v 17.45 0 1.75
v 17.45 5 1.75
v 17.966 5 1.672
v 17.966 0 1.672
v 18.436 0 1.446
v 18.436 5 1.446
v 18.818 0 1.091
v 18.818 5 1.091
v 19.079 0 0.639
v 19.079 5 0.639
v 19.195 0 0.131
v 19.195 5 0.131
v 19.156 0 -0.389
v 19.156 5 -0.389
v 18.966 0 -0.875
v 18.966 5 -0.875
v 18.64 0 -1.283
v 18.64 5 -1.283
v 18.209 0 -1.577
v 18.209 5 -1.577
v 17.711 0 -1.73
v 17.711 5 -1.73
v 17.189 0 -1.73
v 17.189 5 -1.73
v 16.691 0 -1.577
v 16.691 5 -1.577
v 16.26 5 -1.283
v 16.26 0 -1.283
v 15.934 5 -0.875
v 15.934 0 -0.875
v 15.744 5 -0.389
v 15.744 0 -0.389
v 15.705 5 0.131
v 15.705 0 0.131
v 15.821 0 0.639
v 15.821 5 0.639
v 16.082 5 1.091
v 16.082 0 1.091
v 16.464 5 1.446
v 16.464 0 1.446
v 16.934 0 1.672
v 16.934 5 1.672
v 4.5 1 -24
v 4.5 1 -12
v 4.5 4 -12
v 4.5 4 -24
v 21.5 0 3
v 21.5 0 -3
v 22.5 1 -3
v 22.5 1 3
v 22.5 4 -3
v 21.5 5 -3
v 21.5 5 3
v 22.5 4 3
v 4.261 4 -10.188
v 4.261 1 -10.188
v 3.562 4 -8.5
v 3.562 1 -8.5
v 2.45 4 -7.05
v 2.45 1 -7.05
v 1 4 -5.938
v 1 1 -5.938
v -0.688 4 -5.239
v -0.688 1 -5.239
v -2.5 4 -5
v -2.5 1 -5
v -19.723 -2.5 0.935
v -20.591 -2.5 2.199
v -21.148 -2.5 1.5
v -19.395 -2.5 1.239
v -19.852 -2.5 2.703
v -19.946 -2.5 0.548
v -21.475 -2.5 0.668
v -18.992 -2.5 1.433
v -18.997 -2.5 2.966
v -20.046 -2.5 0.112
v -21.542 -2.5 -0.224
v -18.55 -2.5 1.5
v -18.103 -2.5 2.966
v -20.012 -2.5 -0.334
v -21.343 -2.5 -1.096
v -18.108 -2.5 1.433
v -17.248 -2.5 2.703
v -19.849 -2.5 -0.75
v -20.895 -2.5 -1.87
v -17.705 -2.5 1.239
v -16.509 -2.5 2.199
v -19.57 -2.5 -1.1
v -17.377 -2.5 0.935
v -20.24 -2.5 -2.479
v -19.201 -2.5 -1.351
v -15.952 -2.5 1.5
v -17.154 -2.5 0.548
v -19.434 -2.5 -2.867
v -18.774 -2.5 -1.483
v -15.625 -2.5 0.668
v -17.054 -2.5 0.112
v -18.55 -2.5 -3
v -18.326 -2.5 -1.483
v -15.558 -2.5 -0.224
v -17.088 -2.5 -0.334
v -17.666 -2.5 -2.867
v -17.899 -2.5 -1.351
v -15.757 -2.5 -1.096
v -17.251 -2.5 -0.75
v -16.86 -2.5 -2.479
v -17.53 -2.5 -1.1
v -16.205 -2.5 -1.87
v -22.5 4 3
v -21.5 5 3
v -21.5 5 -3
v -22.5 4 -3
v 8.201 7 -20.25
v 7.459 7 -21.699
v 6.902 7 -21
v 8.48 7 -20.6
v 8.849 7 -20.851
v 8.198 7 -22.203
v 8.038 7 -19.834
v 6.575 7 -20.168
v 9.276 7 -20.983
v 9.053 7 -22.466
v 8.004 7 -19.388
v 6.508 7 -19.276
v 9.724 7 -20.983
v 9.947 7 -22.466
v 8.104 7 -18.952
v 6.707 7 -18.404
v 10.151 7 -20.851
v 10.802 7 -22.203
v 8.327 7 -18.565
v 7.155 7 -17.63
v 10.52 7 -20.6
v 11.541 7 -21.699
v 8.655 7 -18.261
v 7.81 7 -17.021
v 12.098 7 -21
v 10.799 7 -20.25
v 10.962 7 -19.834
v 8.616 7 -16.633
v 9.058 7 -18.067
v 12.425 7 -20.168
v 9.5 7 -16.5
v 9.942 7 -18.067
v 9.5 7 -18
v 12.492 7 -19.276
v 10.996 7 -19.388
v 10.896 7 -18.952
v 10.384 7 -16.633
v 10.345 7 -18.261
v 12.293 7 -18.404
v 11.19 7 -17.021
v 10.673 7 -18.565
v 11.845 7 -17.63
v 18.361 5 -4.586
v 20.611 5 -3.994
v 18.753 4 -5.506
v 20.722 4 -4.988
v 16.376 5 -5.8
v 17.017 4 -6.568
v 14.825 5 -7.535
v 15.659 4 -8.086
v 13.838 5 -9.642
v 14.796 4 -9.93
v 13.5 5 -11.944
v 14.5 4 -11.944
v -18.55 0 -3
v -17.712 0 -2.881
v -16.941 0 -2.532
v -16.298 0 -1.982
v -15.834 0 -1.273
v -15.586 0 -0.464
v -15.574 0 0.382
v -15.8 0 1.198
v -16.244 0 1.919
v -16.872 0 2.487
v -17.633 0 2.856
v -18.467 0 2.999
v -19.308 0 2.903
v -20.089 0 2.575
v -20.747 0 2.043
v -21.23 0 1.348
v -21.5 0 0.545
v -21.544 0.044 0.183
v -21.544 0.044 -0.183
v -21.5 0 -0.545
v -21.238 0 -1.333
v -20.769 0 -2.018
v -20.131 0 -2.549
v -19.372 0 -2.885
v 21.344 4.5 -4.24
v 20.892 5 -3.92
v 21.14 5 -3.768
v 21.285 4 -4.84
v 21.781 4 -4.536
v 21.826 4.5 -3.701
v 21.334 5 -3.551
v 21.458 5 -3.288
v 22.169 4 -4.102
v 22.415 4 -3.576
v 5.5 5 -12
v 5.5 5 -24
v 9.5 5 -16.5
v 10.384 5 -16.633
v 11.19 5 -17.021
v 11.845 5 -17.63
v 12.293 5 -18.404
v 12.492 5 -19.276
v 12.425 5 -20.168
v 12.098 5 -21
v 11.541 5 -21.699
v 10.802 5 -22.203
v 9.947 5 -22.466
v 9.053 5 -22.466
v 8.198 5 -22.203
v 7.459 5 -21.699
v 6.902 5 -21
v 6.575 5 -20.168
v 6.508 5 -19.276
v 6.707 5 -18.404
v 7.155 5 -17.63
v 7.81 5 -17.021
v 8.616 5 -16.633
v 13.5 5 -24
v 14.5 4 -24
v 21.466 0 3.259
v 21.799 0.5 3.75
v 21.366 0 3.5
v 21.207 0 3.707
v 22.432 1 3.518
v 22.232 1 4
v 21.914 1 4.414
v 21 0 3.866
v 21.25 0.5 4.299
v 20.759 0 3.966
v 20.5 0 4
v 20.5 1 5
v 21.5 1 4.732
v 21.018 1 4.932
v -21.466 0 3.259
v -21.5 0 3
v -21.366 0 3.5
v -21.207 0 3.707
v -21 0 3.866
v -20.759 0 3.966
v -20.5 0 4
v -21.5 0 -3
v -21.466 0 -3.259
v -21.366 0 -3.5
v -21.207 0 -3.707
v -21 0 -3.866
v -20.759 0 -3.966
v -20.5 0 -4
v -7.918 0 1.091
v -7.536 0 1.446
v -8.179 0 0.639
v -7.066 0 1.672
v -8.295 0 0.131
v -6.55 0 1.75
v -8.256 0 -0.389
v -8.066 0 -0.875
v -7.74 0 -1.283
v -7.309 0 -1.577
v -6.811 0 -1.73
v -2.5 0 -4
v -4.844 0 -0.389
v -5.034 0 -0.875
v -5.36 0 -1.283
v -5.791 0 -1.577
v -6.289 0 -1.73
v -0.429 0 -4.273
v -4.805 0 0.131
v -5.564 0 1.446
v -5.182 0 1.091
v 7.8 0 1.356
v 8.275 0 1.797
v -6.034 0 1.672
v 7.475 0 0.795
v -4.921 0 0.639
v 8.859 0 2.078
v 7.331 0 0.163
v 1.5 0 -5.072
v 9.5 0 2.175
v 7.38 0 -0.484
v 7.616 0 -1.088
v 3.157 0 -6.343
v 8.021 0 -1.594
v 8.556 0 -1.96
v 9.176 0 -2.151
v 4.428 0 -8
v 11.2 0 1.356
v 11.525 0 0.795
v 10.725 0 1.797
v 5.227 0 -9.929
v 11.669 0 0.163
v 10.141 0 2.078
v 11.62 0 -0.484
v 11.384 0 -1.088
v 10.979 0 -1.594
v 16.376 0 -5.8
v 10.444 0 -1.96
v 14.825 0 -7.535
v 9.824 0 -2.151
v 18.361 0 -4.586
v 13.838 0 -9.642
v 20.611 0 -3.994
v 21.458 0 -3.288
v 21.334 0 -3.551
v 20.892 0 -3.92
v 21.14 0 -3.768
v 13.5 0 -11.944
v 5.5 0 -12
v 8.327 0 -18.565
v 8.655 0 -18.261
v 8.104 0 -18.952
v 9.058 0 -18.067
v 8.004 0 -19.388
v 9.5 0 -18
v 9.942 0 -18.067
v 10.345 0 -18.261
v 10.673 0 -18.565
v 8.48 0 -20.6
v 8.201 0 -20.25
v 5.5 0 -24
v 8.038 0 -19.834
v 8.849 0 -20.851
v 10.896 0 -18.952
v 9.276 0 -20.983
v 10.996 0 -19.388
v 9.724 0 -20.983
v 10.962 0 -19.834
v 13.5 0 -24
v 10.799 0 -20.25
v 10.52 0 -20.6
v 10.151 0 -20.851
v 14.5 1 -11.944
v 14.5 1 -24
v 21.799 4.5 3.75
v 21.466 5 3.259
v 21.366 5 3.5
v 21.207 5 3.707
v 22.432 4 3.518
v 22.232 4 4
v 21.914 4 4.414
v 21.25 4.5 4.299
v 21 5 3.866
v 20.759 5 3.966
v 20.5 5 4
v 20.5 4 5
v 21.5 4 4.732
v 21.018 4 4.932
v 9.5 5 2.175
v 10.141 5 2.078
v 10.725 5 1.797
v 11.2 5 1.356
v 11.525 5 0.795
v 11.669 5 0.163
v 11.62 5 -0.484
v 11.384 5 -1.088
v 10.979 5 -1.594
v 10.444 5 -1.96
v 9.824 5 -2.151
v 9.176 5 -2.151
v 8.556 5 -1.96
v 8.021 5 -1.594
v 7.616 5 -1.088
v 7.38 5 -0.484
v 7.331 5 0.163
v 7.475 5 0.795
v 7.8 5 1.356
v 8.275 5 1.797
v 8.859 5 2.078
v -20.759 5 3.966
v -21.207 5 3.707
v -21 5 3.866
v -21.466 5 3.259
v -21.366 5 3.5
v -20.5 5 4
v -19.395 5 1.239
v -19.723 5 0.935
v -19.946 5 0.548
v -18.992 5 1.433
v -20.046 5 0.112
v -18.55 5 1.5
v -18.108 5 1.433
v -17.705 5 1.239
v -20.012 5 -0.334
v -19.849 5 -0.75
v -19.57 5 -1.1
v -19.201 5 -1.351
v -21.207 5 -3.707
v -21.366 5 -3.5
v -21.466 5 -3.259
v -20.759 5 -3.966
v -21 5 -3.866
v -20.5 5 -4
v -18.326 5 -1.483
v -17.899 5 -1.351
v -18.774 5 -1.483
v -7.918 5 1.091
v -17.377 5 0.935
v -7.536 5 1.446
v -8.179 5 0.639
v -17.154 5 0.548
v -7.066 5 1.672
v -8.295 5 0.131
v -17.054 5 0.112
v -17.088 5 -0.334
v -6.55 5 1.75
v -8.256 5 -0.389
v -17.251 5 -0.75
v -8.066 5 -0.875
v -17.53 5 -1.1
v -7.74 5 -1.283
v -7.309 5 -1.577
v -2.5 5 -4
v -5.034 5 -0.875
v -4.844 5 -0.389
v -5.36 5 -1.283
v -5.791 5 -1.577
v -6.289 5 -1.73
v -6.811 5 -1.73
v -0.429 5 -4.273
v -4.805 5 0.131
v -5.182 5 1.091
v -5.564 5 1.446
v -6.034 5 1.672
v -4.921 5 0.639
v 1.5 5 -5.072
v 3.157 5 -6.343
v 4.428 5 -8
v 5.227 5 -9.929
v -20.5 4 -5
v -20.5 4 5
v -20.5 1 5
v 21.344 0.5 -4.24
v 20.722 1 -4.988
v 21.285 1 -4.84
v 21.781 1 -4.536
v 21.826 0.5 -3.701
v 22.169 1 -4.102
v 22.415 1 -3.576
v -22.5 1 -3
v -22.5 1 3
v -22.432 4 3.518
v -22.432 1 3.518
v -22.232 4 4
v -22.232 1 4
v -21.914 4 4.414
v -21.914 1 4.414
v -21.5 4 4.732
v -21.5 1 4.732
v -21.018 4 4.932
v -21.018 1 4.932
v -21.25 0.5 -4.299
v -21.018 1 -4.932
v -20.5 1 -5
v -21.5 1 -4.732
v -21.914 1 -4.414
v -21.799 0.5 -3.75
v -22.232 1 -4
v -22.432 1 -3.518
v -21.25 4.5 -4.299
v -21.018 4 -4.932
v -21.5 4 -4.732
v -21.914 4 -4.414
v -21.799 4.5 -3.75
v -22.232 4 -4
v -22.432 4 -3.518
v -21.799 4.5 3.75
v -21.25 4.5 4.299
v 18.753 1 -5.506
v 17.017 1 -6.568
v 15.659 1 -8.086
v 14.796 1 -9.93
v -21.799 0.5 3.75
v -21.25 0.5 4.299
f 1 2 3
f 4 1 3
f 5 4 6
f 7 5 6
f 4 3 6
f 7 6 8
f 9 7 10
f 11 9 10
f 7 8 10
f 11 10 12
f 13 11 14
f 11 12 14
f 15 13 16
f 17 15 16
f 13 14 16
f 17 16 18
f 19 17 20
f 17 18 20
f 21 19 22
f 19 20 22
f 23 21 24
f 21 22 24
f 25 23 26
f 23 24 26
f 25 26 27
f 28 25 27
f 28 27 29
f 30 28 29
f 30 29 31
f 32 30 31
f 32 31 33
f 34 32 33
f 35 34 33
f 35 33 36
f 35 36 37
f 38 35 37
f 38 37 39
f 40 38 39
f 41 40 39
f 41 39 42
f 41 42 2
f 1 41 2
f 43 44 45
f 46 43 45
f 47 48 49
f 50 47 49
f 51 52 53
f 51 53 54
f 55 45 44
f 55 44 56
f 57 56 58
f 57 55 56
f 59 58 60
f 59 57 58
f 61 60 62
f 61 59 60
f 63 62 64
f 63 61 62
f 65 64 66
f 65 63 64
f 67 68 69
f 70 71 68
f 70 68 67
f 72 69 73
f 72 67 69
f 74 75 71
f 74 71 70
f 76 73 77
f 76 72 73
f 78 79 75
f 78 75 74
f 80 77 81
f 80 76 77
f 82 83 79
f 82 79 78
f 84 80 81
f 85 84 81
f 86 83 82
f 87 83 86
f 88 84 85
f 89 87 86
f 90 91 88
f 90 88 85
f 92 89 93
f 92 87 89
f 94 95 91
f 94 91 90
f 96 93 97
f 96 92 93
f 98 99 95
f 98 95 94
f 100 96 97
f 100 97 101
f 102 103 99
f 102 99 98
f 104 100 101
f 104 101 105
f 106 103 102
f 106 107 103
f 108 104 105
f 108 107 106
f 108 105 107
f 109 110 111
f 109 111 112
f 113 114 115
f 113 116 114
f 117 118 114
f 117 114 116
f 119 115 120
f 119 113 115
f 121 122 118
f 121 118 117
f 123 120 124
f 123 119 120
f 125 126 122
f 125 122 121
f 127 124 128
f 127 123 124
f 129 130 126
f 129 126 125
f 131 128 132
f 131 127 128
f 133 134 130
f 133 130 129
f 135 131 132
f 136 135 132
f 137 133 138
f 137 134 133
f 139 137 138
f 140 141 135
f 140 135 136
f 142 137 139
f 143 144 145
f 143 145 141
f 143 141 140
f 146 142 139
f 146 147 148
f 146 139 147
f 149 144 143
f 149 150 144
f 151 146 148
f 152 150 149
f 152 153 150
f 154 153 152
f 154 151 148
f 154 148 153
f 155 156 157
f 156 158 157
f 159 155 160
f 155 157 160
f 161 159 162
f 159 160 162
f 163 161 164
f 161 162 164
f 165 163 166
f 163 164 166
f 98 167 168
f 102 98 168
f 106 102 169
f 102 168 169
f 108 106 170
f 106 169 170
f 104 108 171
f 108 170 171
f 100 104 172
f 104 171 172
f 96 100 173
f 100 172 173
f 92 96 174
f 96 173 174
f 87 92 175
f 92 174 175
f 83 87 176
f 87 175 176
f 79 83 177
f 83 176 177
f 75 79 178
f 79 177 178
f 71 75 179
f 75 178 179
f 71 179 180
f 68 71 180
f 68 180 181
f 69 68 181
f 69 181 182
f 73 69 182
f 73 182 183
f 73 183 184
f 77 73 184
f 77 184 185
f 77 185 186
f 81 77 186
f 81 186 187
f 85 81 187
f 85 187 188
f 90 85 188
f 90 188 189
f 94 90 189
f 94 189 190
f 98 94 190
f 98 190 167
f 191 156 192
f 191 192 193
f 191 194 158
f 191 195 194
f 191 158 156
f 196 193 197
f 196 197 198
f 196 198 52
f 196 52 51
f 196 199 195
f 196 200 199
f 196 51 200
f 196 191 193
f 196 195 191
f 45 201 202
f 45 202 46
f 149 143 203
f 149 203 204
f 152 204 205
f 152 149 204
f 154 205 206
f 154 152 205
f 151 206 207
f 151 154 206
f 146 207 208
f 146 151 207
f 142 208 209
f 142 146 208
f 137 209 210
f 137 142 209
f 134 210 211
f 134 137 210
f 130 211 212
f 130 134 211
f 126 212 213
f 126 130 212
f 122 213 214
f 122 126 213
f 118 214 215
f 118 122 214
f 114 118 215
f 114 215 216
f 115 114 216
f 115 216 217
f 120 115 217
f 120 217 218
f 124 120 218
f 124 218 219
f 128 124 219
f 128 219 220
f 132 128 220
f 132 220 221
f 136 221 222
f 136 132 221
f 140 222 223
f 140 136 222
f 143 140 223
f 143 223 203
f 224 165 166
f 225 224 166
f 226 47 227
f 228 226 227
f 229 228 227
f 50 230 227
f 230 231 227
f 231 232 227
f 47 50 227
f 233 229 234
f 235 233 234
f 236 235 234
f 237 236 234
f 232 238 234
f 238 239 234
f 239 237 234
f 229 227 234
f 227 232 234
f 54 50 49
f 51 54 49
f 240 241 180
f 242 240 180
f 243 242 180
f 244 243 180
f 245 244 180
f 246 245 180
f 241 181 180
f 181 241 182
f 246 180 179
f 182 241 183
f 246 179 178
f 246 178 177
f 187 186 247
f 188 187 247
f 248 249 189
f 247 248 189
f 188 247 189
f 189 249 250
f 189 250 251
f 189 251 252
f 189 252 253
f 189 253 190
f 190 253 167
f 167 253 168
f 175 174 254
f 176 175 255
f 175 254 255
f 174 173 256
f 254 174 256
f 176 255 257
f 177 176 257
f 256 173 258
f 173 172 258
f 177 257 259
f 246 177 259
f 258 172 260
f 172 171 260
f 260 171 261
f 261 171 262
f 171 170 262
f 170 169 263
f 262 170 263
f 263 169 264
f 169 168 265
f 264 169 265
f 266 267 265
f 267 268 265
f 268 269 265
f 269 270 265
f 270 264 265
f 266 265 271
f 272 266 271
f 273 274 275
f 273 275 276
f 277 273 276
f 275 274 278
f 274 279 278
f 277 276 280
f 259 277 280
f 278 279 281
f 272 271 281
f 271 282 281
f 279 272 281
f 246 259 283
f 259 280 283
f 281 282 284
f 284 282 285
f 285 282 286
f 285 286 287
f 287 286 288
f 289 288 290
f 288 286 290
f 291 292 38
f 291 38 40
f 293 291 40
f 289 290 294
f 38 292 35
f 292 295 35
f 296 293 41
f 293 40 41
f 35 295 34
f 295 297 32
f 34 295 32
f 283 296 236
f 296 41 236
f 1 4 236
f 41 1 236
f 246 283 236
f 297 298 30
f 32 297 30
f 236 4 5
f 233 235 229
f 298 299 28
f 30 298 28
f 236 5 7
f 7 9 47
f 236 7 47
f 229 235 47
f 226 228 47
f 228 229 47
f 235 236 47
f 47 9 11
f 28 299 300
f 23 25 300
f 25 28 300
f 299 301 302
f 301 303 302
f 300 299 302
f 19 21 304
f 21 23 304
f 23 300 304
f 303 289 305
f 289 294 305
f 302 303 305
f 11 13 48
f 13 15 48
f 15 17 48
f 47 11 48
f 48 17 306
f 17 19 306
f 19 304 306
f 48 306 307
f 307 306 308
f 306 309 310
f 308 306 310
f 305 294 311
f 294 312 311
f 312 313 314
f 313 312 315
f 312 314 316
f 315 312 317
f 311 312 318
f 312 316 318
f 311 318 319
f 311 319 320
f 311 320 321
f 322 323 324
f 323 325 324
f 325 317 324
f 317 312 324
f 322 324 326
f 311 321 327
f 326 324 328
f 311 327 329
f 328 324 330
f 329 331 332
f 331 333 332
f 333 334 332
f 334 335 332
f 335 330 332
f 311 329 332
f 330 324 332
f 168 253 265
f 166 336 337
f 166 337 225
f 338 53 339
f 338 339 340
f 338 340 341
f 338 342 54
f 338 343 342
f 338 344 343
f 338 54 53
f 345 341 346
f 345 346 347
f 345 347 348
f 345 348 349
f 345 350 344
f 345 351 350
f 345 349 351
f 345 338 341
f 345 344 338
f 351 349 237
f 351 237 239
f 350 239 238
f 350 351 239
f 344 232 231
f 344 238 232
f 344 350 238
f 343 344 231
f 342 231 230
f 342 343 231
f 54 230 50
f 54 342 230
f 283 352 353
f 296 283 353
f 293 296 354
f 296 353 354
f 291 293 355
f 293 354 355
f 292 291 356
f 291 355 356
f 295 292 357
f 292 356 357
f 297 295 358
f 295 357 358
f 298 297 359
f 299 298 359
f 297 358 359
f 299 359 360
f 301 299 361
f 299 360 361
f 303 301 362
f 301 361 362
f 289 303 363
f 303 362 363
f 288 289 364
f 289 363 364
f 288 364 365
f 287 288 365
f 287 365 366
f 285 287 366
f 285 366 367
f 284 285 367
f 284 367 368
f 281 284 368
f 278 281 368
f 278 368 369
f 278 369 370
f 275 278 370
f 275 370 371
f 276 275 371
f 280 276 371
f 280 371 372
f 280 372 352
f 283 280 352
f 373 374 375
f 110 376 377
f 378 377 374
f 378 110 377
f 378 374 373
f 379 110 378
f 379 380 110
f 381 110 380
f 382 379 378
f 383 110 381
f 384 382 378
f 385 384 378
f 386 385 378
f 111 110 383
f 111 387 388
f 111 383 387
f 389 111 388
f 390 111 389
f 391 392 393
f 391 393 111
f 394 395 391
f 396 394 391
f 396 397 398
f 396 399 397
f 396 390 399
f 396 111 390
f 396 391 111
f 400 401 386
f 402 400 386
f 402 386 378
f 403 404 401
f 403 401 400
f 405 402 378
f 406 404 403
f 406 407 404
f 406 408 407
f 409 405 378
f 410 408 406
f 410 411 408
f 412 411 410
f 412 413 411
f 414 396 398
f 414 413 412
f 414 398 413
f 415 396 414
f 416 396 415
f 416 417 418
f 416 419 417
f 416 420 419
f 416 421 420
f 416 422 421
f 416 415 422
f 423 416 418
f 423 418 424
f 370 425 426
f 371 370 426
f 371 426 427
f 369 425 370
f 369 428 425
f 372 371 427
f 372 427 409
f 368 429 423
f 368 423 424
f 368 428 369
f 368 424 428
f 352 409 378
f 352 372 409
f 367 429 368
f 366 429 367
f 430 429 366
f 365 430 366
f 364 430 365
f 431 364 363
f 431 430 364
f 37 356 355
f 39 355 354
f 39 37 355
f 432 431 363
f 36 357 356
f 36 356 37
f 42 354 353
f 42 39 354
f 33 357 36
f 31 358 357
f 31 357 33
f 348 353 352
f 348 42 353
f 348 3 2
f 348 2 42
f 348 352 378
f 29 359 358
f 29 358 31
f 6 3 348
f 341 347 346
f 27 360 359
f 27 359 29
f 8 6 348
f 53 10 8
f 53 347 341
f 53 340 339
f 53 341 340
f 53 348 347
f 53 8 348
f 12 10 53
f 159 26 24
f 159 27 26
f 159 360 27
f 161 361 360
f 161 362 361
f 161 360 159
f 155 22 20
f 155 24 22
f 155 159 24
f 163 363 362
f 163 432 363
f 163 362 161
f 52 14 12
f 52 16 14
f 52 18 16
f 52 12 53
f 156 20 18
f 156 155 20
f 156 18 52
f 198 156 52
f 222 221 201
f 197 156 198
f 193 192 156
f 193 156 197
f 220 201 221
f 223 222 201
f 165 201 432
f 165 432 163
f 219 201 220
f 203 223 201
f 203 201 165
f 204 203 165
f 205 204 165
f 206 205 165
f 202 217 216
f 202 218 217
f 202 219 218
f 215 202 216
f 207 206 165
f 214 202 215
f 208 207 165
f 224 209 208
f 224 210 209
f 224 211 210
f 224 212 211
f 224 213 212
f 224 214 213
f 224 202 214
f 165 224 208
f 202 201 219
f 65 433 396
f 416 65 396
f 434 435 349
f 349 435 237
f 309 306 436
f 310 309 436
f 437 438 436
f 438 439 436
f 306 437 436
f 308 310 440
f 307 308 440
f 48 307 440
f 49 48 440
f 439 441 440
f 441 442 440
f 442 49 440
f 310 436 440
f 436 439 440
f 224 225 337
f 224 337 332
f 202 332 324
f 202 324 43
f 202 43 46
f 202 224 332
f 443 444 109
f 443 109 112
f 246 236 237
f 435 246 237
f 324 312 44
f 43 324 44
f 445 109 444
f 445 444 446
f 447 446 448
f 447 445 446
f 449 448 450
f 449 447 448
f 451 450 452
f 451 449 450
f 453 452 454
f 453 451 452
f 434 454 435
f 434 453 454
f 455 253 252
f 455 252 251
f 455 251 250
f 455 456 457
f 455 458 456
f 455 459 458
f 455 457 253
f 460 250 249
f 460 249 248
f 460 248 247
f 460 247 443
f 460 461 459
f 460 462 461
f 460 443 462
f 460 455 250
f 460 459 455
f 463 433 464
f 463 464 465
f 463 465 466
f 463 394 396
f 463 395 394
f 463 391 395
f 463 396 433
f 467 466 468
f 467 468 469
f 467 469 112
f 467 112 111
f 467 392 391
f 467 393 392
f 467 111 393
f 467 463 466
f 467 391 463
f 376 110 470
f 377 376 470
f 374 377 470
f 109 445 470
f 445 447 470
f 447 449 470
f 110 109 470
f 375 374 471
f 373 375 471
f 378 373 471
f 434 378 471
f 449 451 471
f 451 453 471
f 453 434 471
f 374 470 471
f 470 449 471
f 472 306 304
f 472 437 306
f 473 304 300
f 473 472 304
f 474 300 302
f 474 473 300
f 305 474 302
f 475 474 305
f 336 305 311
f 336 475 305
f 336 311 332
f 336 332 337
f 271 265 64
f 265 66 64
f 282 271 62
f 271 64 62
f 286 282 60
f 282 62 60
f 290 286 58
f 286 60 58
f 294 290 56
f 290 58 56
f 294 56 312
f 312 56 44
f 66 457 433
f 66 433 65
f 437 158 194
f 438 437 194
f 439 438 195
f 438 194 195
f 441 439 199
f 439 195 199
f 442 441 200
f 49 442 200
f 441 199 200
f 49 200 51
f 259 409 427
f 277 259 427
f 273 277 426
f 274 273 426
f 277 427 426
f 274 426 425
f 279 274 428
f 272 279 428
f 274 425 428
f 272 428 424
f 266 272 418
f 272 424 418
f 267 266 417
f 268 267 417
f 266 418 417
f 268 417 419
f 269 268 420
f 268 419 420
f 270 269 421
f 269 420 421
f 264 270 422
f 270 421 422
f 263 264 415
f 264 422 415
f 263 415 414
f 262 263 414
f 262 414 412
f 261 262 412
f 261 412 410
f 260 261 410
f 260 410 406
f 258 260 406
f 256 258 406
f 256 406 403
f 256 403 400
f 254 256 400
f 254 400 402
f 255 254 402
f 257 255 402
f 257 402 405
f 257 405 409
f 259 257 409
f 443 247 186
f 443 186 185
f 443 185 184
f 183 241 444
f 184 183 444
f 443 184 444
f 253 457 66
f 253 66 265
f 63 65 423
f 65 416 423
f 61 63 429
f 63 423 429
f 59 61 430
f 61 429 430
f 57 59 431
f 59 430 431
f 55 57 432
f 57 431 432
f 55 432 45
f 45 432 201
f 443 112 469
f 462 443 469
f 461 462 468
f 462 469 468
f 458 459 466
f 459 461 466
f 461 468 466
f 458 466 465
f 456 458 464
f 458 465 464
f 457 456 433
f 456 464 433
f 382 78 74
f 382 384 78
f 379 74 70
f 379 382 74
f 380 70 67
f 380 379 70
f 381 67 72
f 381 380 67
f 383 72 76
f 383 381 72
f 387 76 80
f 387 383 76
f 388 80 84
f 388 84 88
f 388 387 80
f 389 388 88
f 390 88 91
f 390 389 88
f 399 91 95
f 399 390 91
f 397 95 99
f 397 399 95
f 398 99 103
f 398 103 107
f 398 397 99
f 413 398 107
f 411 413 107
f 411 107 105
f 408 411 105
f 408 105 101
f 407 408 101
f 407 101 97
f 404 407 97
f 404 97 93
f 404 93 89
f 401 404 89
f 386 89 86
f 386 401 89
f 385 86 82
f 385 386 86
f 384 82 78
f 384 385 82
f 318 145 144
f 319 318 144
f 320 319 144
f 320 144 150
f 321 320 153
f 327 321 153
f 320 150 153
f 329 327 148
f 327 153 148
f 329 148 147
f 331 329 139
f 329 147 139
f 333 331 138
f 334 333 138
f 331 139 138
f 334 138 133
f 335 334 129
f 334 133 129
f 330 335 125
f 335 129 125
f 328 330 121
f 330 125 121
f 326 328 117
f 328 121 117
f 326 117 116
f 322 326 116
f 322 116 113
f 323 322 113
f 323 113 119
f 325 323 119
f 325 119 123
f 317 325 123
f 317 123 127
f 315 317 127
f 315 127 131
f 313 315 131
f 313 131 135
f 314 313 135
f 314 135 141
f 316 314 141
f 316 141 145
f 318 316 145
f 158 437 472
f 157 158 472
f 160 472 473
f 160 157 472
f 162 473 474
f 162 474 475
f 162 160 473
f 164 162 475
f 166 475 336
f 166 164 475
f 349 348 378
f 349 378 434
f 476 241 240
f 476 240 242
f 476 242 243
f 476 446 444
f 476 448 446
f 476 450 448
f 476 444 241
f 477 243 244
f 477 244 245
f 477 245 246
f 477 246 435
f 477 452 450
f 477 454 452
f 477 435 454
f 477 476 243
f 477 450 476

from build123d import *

# Parameters (mm, degrees)
SKETCH1_W           = 45
SKETCH1_H           = 10
BOSS_EXTRUDE1_DEPTH = 5
SKETCH3_R           = 1.5
SKETCH3_R_2         = 2.175
SKETCH3_R_3         = 1.75
CUT_EXTRUDE1_DEPTH  = 7
FILLET1_R           = 2
SKETCH4_R           = 3
SKETCH4_R_2         = 1.5
BOSS_EXTRUDE2_DEPTH = 2.5
SKETCH5_W           = 10
SKETCH5_H           = 5
BOSS_EXTRUDE3_DEPTH = 19
SKETCH6_R           = 1.5
CUT_EXTRUDE2_DEPTH  = 10
BOSS_EXTRUDE4_START = 2
SKETCH7_R           = 3
SKETCH7_R_2         = 1.5
BOSS_EXTRUDE4_DEPTH = 2
FILLET2_R           = 7
CHAMFER1_SIZE       = 1


with BuildPart() as part:
    # Sketch1 → Boss-Extrude1 (new body)
    with BuildSketch(Plane(origin=(0, 0, 0), x_dir=(1, 0, 0), z_dir=(0, 1, 0))):
        Rectangle(SKETCH1_W, SKETCH1_H)
    extrude(amount=BOSS_EXTRUDE1_DEPTH)

    # Sketch3 → Cut-Extrude1 (cut)
    with BuildSketch(Plane(origin=(0, 5, 0), x_dir=(1, 0, 0), z_dir=(0, 1, 0))):
        with Locations(Location((-18.55, 0, 0), (0, 0, 270))):
            Circle(SKETCH3_R)
        with Locations(Location((9.5, 0, 0), (0, 0, 270))):
            Circle(SKETCH3_R_2)
        with Locations(Location((-6.55, 0, 0), (0, 0, 270))):
            Circle(SKETCH3_R_3)
        with Locations(Location((17.45, 0, 0), (0, 0, 270))):
            Circle(SKETCH3_R_3)
    extrude(amount=-CUT_EXTRUDE1_DEPTH, mode=Mode.SUBTRACT)

    # Fillet1
    fillet1_edges = [part.edges().sort_by_distance(p)[0] for p in [
        (22.5, 2.5, 5),
        (-22.5, 2.5, 5),
        (-22.5, 2.5, -5),
        (22.5, 2.5, -5),
    ]]
    fillet(fillet1_edges, radius=FILLET1_R)

    # Sketch4 → Boss-Extrude2 (add)
    with BuildSketch(Plane.XZ):
        with Locations(Location((-18.55, 0, 0), (0, 0, 270))):
            Circle(SKETCH4_R)
        with Locations(Location((-18.55, 0, 0), (0, 0, 90))):
            Circle(SKETCH4_R_2, mode=Mode.SUBTRACT)
    extrude(amount=BOSS_EXTRUDE2_DEPTH)

    # Sketch5 → Boss-Extrude3 (add)
    with BuildSketch(Plane(origin=(0, 0, -5), x_dir=(-1, 0, 0), z_dir=(0, 0, -1))):
        with Locations((-9.5, 2.5)):
            Rectangle(SKETCH5_W, SKETCH5_H)
    extrude(amount=BOSS_EXTRUDE3_DEPTH)

    # Sketch6 → Cut-Extrude2 (cut)
    with BuildSketch(Plane(origin=(0, 5, 0), x_dir=(1, 0, 0), z_dir=(0, 1, 0))):
        with Locations(Location((9.5, 19.5, 0), (0, 0, 270))):
            Circle(SKETCH6_R)
    extrude(amount=-CUT_EXTRUDE2_DEPTH, mode=Mode.SUBTRACT)

    # Sketch7 → Boss-Extrude4 (add)
    with BuildSketch(Plane(origin=(0, 5, 0), x_dir=(1, 0, 0), z_dir=(0, 1, 0)).offset(BOSS_EXTRUDE4_START)):
        with Locations(Location((9.5, 19.5, 0), (0, 0, 270))):
            Circle(SKETCH7_R)
        with Locations(Location((9.5, 19.5, 0), (0, 0, 270))):
            Circle(SKETCH7_R_2, mode=Mode.SUBTRACT)
    extrude(amount=-BOSS_EXTRUDE4_DEPTH)

    # Fillet2
    fillet2_edges = [part.edges().sort_by_distance(p)[0] for p in [
        (4.5, 2.5, -5),
        (14.5, 2.5, -5),
    ]]
    fillet(fillet2_edges, radius=FILLET2_R)

    # Chamfer1
    # the kernel refuses this chamfer: 1 mm, written as the material it takes off along each edge
    with BuildSketch(Plane(origin=(-20.5, 0, -5), x_dir=(0, 1, 0), z_dir=(1, 0, 0))) as chamfer1_piece_1:
        Polygon((CHAMFER1_SIZE, 0), (0, CHAMFER1_SIZE), (0, 0), align=None)
    extrude(amount=18, mode=Mode.SUBTRACT)
    with BuildSketch(Plane(origin=(-20.5, 5, -5), x_dir=(0, -1, 0), z_dir=(1, 0, 0))) as chamfer1_piece_2:
        Polygon((CHAMFER1_SIZE, 0), (0, -CHAMFER1_SIZE), (0, 0), align=None)
    extrude(amount=18, mode=Mode.SUBTRACT)
    with BuildSketch(Plane(origin=(20.5, 0, -3), x_dir=(0.11111111111111072, 0, -0.9938079899999066), z_dir=(-0.9938079899999066, 0, -0.11111111111111072))) as chamfer1_piece_3:
        Polygon((2 - CHAMFER1_SIZE, 0), (2, -CHAMFER1_SIZE), (2, 0), align=None)
    revolve(axis=Axis((20.5, 0, -3), (0, -1, 0)), revolution_arc=83.620629792, mode=Mode.SUBTRACT)
    with BuildSketch(Plane(origin=(-2.5, 5, -12), x_dir=(0, 0, 1), z_dir=(-1, 0, 0))) as chamfer1_piece_4:
        Polygon((7, -CHAMFER1_SIZE), (7 + CHAMFER1_SIZE, 0), (7, 0), align=None)
    revolve(axis=Axis((-2.5, 5, -12), (0, 1, 0)), revolution_arc=90, mode=Mode.SUBTRACT)
    with BuildSketch(Plane(origin=(-2.5, 0, -12), x_dir=(0, 0, 1), z_dir=(-1, 0, 0))) as chamfer1_piece_5:
        Polygon((7 + CHAMFER1_SIZE, 0), (7, CHAMFER1_SIZE), (7, 0), align=None)
    revolve(axis=Axis((-2.5, 0, -12), (0, 1, 0)), revolution_arc=90, mode=Mode.SUBTRACT)
    with BuildSketch(Plane(origin=(21.499999975, 0, -11.944271843), x_dir=(-0.11111110870133047, 0, 0.9938079902693282), z_dir=(0.9938079902693282, 0, 0.11111110870133047))) as chamfer1_piece_6:
        Polygon((6.999999931 + CHAMFER1_SIZE, 0), (6.999999931 + CHAMFER1_SIZE * 6.29164365051e-09, -CHAMFER1_SIZE), (6.999999931, 0), align=None)
    revolve(axis=Axis((21.499999975, 0, -11.944271843), (0, -1, 0)), revolution_arc=83.620630478, mode=Mode.SUBTRACT)
    with BuildSketch(Plane(origin=(21.499999975, 5, -11.944271843), x_dir=(-0.11111110870132958, 0, 0.9938079902693283), z_dir=(0.9938079902693283, 0, 0.11111110870132958))) as chamfer1_piece_7:
        Polygon((6.999999931 + CHAMFER1_SIZE, 0), (6.999999931 + CHAMFER1_SIZE * 6.2916400978e-09, CHAMFER1_SIZE), (6.999999931, 0), align=None)
    revolve(axis=Axis((21.499999975, 5, -11.944271843), (0, -1, 0)), revolution_arc=83.620630478, mode=Mode.SUBTRACT)
    with BuildSketch(Plane(origin=(22.5, 0, -3), x_dir=(-1, 0, 0), z_dir=(0, 0, 1))) as chamfer1_piece_8:
        Polygon((CHAMFER1_SIZE, 0), (0, -CHAMFER1_SIZE), (0, 0), align=None)
    extrude(amount=6, mode=Mode.SUBTRACT)
    with BuildSketch(Plane(origin=(20.5, 0, 5), x_dir=(0, 0, -1), z_dir=(-1, 0, 0))) as chamfer1_piece_9:
        Polygon((CHAMFER1_SIZE, 0), (0, -CHAMFER1_SIZE), (0, 0), align=None)
    extrude(amount=41, mode=Mode.SUBTRACT)
    with BuildSketch(Plane(origin=(-22.5, 0, 3), x_dir=(1, 0, 0), z_dir=(0, 0, -1))) as chamfer1_piece_10_section:
        Polygon((CHAMFER1_SIZE, 0), (0, -CHAMFER1_SIZE), (0, 0), align=None)
    chamfer1_piece_10 = extrude(amount=6, mode=Mode.PRIVATE)
    chamfer1_piece_10 = chamfer1_piece_10 - Plane(origin=(-18.55, 0, 0), x_dir=(0, 0, -1), z_dir=(0, 1, 0)) * Cylinder(3, 16, mode=Mode.PRIVATE)
    add(chamfer1_piece_10, mode=Mode.SUBTRACT)
    with BuildSketch(Plane(origin=(-20.5, 0, 3), x_dir=(-1, 0, 0), z_dir=(0, 0, -1))) as chamfer1_piece_11:
        Polygon((2 - CHAMFER1_SIZE, 0), (2, CHAMFER1_SIZE), (2, 0), align=None)
    revolve(axis=Axis((-20.5, 0, 3), (0, 1, 0)), revolution_arc=90, mode=Mode.SUBTRACT)
    with BuildSketch(Plane(origin=(20.5, 0, 3), x_dir=(1, 0, 0), z_dir=(0, 0, -1))) as chamfer1_piece_12:
        Polygon((2 - CHAMFER1_SIZE, 0), (2, -CHAMFER1_SIZE), (2, 0), align=None)
    revolve(axis=Axis((20.5, 0, 3), (0, -1, 0)), revolution_arc=90, mode=Mode.SUBTRACT)
    with BuildSketch(Plane(origin=(-20.5, 0, -3), x_dir=(0, 0, -1), z_dir=(1, 0, 0))) as chamfer1_piece_13:
        Polygon((2 - CHAMFER1_SIZE, 0), (2, CHAMFER1_SIZE), (2, 0), align=None)
    revolve(axis=Axis((-20.5, 0, -3), (0, 1, 0)), revolution_arc=90, mode=Mode.SUBTRACT)
    with BuildSketch(Plane(origin=(22.5, 5, -3), x_dir=(-1, 0, 0), z_dir=(0, 0, 1)), Plane(origin=(-22.5, 5, 3), x_dir=(1, 0, 0), z_dir=(0, 0, -1))) as chamfer1_piece_14:
        Polygon((CHAMFER1_SIZE, 0), (0, CHAMFER1_SIZE), (0, 0), align=None)
    extrude(amount=6, mode=Mode.SUBTRACT)
    with BuildSketch(Plane(origin=(20.5, 5, 5), x_dir=(0, 0, -1), z_dir=(-1, 0, 0))) as chamfer1_piece_15:
        Polygon((CHAMFER1_SIZE, 0), (0, CHAMFER1_SIZE), (0, 0), align=None)
    extrude(amount=41, mode=Mode.SUBTRACT)
    with BuildSketch(Plane(origin=(-20.5, 5, 3), x_dir=(-1, 0, 0), z_dir=(0, 0, -1))) as chamfer1_piece_16:
        Polygon((2 - CHAMFER1_SIZE, 0), (2, -CHAMFER1_SIZE), (2, 0), align=None)
    revolve(axis=Axis((-20.5, 5, 3), (0, 1, 0)), revolution_arc=90, mode=Mode.SUBTRACT)
    with BuildSketch(Plane(origin=(20.5, 5, 3), x_dir=(1, 0, 0), z_dir=(0, 0, -1))) as chamfer1_piece_17:
        Polygon((2 - CHAMFER1_SIZE, 0), (2, CHAMFER1_SIZE), (2, 0), align=None)
    revolve(axis=Axis((20.5, 5, 3), (0, -1, 0)), revolution_arc=90, mode=Mode.SUBTRACT)
    with BuildSketch(Plane(origin=(-20.5, 5, -3), x_dir=(0, 0, -1), z_dir=(1, 0, 0))) as chamfer1_piece_18:
        Polygon((2, -CHAMFER1_SIZE), (2 - CHAMFER1_SIZE, 0), (2, 0), align=None)
    revolve(axis=Axis((-20.5, 5, -3), (0, 1, 0)), revolution_arc=90, mode=Mode.SUBTRACT)
    with BuildSketch(Plane(origin=(20.5, 5, -3), x_dir=(0.11111111111111072, 0, -0.9938079899999066), z_dir=(-0.9938079899999066, 0, -0.11111111111111072))) as chamfer1_piece_19:
        Polygon((2 - CHAMFER1_SIZE, 0), (2, CHAMFER1_SIZE), (2, 0), align=None)
    revolve(axis=Axis((20.5, 5, -3), (0, -1, 0)), revolution_arc=83.620629792, mode=Mode.SUBTRACT)
    with BuildSketch(Plane(origin=(14.5, 5, -11.94427191), x_dir=(-1, 0, 0), z_dir=(0, 0, -1))) as chamfer1_piece_20:
        Polygon((CHAMFER1_SIZE, 0), (0, -CHAMFER1_SIZE), (0, 0), align=None)
    extrude(amount=14.627411078, mode=Mode.SUBTRACT)
    with BuildSketch(Plane(origin=(14.5, 0, -11.94427191), x_dir=(-1, 0, 0), z_dir=(0, 0, -1))) as chamfer1_piece_21:
        Polygon((CHAMFER1_SIZE, 0), (0, CHAMFER1_SIZE), (0, 0), align=None)
    extrude(amount=14.627411078, mode=Mode.SUBTRACT)
    with BuildSketch(Plane(origin=(4.5, 0, -12), x_dir=(1, 0, 0), z_dir=(0, 0, -1))) as chamfer1_piece_22:
        Polygon((CHAMFER1_SIZE, 0), (0, -CHAMFER1_SIZE), (0, 0), align=None)
    extrude(amount=14.571682988, mode=Mode.SUBTRACT)
    with BuildSketch(Plane(origin=(4.5, 5, -12), x_dir=(1, 0, 0), z_dir=(0, 0, -1))) as chamfer1_piece_23:
        Polygon((CHAMFER1_SIZE, 0), (0, CHAMFER1_SIZE), (0, 0), align=None)
    extrude(amount=14.571682988, mode=Mode.SUBTRACT)


solid = part.part
